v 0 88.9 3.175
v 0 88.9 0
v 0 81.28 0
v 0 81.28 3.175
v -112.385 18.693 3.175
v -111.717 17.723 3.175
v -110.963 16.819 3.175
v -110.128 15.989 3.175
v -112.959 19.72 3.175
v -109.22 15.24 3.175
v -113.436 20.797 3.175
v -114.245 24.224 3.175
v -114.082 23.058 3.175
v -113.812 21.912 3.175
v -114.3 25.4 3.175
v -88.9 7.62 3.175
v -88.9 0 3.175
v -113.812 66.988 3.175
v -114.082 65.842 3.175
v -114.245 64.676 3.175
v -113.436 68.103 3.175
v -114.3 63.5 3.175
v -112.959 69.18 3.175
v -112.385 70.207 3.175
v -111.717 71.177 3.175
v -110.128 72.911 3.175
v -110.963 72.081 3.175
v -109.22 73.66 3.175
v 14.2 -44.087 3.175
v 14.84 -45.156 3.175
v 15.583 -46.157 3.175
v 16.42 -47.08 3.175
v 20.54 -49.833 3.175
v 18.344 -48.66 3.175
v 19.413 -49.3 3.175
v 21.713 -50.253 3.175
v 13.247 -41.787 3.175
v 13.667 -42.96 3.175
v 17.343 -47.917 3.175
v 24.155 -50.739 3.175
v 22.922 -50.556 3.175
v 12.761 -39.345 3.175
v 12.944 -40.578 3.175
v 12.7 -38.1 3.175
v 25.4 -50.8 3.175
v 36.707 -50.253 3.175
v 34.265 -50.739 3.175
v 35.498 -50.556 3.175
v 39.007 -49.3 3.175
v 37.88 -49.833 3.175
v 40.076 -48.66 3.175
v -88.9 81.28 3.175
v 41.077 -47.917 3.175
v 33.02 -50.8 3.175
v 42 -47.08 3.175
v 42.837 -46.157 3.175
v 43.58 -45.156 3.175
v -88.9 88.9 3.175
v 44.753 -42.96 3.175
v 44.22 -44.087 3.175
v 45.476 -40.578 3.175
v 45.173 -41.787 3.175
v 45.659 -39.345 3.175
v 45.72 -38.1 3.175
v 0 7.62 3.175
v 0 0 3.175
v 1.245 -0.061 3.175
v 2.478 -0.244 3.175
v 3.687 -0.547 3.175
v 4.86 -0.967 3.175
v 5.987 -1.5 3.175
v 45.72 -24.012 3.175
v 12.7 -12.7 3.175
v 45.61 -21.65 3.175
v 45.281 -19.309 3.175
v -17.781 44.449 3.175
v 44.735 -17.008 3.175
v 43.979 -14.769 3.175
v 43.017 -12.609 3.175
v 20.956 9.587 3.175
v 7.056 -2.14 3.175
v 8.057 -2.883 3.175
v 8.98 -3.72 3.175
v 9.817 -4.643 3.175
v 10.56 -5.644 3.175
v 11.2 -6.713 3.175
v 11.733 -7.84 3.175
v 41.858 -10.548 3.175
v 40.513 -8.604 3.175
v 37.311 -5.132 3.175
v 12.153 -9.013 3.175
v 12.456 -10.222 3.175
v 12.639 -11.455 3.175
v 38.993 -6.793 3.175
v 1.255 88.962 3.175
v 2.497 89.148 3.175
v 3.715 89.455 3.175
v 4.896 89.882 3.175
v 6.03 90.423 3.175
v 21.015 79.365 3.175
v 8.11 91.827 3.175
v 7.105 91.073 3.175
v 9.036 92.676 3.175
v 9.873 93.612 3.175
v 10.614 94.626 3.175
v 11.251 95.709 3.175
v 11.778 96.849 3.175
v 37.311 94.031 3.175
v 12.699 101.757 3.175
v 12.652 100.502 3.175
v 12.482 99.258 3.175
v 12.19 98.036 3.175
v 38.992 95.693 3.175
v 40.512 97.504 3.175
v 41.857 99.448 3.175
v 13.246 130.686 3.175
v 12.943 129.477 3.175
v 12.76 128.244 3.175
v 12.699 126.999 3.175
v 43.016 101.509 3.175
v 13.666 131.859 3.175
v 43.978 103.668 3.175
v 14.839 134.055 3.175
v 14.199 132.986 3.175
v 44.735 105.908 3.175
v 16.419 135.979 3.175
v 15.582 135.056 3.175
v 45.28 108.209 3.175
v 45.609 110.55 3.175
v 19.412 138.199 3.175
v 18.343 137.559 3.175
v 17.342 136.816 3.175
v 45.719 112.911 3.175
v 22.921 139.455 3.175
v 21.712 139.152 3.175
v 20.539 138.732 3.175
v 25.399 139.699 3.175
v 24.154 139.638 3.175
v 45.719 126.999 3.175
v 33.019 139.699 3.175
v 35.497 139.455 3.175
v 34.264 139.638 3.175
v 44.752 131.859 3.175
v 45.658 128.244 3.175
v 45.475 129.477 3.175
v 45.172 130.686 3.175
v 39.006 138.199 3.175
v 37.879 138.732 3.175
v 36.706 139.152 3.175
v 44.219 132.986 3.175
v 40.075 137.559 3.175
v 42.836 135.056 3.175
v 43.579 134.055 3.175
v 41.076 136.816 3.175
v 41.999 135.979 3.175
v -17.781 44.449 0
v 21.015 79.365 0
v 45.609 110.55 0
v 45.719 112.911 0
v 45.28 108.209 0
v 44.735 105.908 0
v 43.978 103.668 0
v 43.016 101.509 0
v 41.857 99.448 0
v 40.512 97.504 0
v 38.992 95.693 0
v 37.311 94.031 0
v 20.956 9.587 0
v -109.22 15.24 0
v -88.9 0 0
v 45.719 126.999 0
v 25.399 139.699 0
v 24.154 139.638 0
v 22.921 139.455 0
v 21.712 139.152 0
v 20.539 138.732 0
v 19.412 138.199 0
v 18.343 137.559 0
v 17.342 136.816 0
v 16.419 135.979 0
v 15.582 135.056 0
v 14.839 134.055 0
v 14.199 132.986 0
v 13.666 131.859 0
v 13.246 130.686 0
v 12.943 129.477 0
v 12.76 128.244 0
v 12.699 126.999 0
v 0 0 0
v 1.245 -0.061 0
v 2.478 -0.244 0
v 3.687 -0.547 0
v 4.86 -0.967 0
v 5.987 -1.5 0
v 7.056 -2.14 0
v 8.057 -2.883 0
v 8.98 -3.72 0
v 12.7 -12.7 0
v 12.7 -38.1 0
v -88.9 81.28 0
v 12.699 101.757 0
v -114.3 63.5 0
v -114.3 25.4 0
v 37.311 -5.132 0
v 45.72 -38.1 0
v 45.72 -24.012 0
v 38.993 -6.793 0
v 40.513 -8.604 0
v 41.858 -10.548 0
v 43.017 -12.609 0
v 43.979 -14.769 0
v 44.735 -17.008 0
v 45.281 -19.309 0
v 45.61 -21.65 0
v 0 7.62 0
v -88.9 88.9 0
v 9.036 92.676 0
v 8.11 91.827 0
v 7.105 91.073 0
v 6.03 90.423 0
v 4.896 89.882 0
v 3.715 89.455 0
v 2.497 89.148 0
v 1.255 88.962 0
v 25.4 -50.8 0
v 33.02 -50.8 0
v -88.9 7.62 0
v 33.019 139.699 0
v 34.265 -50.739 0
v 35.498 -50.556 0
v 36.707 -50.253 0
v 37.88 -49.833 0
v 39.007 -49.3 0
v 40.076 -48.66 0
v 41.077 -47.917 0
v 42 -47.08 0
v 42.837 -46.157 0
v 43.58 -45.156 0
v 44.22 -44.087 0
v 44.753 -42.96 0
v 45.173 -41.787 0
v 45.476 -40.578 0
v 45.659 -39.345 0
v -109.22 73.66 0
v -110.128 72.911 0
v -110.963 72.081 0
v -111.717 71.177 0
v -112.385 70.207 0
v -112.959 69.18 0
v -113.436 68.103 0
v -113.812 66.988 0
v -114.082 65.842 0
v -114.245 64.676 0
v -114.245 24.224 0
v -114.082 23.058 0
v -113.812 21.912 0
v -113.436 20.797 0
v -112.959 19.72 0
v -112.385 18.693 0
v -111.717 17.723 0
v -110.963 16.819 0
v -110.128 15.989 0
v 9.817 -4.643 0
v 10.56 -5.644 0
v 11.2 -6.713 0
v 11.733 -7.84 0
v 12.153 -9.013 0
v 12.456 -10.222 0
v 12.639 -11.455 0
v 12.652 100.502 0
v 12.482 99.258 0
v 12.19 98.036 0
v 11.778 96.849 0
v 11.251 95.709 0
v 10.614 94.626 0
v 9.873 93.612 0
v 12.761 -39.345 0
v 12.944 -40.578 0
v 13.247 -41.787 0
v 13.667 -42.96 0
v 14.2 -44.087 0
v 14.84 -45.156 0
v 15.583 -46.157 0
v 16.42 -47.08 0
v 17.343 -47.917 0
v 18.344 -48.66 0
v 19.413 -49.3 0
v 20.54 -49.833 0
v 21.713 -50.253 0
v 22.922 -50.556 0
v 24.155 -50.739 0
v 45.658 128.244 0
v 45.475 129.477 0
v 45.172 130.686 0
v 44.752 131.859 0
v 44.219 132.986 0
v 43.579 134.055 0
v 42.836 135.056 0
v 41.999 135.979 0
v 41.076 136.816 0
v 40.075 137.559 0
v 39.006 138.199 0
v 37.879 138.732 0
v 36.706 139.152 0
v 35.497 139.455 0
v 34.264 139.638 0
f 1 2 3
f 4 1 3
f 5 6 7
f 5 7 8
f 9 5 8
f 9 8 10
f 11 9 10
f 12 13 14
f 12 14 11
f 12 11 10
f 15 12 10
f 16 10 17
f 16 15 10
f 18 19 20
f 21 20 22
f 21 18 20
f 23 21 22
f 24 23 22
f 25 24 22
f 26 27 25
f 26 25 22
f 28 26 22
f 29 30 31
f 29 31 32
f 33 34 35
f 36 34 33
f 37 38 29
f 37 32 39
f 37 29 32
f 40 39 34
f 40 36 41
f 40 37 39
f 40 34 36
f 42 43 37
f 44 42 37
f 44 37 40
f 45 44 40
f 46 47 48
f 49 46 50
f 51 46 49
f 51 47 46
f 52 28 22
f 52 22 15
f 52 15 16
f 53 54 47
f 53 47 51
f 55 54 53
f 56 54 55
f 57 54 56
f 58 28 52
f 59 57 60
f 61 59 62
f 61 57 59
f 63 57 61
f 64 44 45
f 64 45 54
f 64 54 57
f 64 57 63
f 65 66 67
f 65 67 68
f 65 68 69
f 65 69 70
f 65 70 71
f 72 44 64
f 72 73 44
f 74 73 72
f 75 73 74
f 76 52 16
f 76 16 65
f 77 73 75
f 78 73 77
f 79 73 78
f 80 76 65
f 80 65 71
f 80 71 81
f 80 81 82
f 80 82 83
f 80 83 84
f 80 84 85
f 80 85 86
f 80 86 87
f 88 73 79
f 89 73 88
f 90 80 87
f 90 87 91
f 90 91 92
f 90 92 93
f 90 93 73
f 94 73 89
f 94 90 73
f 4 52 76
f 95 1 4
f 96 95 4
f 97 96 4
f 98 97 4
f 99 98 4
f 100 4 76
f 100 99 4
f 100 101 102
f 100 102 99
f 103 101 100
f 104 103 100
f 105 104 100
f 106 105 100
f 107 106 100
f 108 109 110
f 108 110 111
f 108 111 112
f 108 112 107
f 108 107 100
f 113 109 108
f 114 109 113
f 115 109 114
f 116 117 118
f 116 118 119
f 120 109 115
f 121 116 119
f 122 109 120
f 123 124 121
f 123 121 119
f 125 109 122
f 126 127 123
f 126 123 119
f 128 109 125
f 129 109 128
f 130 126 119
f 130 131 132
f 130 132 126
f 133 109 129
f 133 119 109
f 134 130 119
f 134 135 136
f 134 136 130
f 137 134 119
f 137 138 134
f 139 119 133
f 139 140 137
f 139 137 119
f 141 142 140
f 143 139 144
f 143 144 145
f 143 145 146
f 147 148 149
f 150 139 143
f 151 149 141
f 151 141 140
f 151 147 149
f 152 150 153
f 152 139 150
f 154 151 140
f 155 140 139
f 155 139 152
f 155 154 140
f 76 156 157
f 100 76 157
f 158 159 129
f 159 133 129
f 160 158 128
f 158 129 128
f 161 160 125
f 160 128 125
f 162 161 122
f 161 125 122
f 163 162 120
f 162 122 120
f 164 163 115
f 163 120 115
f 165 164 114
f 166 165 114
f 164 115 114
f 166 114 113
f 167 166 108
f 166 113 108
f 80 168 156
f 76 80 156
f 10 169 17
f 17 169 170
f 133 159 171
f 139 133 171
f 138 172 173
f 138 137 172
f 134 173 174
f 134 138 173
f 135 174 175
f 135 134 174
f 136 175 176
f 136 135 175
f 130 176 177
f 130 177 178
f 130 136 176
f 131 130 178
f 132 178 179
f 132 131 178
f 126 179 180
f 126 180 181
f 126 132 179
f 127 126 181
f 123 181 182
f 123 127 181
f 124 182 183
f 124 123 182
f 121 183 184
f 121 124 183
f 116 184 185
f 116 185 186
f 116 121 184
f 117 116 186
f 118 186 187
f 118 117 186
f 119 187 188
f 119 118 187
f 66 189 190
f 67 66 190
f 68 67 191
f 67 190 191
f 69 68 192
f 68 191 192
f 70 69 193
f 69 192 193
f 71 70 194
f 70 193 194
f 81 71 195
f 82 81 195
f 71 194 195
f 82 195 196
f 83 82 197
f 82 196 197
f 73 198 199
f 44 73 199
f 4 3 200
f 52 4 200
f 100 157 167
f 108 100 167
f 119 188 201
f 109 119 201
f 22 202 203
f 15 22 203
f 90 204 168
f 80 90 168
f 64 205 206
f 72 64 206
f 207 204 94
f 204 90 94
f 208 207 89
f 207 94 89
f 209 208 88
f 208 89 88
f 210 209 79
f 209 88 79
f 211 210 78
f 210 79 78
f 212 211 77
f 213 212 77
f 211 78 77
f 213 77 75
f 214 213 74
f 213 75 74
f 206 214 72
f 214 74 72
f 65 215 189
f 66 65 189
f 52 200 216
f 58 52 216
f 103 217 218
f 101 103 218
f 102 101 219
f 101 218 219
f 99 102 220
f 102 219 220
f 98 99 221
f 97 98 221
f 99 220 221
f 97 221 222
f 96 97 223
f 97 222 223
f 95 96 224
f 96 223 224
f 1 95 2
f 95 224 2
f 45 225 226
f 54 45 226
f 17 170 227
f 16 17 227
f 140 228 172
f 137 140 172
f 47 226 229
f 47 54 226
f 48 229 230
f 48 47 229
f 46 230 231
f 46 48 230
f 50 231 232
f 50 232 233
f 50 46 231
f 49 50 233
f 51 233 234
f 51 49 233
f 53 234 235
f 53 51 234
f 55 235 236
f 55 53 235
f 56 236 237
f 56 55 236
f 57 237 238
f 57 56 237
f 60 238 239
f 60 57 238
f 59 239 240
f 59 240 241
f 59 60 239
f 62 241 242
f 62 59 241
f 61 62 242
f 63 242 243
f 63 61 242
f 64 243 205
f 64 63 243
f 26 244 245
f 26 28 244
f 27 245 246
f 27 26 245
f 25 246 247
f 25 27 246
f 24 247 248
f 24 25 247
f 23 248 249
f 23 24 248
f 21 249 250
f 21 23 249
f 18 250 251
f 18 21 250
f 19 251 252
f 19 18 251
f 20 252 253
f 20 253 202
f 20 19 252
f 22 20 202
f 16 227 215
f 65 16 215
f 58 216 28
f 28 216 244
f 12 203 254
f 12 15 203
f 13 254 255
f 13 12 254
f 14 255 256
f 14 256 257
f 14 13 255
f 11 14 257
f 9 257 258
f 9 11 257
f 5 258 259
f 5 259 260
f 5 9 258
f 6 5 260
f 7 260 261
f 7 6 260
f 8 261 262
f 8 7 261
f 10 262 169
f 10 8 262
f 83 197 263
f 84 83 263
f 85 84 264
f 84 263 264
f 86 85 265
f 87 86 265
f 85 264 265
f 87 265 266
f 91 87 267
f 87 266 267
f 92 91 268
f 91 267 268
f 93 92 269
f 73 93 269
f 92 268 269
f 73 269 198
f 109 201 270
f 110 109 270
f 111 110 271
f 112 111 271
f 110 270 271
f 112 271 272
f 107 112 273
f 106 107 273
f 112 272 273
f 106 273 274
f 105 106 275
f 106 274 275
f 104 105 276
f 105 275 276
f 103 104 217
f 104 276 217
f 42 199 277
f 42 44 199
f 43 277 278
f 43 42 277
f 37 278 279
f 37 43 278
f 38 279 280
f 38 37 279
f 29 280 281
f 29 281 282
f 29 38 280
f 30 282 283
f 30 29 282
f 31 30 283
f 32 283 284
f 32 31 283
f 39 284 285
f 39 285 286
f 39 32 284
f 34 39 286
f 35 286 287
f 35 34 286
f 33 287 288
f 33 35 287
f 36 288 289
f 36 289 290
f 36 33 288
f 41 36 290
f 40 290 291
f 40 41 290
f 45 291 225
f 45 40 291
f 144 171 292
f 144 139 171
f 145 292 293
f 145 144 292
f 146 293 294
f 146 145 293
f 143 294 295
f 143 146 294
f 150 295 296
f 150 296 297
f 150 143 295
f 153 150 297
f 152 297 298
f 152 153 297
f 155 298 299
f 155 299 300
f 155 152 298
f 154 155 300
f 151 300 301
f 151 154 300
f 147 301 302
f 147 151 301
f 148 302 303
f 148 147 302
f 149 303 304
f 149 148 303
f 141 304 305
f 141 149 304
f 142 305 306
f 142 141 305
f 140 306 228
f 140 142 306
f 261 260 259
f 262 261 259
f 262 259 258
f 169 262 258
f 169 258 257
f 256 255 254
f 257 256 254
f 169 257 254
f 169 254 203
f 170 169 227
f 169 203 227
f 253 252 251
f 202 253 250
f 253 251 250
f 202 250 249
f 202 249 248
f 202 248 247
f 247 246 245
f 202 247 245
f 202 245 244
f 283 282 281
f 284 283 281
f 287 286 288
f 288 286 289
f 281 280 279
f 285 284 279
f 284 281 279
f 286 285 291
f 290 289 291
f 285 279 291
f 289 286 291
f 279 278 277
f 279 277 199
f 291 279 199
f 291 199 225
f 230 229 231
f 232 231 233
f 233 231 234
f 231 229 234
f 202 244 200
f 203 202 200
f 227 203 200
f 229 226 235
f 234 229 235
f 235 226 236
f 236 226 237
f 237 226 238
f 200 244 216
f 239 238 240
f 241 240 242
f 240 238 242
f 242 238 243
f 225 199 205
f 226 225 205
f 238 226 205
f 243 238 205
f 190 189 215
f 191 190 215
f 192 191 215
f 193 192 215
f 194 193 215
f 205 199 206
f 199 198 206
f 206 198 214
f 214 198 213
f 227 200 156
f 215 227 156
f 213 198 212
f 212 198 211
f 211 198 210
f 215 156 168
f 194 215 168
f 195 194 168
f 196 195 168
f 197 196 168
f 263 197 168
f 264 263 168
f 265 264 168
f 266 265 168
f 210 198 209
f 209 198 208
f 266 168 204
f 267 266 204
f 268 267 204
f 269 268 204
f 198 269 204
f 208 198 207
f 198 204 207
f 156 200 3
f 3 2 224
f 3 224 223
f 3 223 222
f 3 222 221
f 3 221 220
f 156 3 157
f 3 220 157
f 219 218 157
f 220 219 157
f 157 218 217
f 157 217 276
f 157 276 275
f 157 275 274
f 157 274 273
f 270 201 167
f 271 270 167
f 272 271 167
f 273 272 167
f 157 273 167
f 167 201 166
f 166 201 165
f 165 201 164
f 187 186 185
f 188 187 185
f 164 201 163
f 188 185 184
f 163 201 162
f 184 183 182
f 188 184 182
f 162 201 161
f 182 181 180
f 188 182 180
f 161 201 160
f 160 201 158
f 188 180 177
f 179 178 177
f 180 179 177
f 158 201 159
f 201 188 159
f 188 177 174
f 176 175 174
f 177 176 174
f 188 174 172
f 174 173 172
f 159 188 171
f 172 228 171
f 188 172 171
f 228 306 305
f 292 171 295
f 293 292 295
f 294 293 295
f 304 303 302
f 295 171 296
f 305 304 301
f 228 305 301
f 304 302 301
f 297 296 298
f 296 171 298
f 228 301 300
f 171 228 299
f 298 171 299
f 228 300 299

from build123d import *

# Parameters (mm, degrees)
F1_DEPTH = 3.175
F2_R     = 12.7
F3_R     = 25.4


with BuildPart() as f1:
    # F0 (on Top) → F1 (new body)
    with BuildSketch(Plane.XY):
        with BuildLine():
            Line((9.035718, 92.67555), (21.014816, 79.365334))
            Line((21.014816, 79.365334), (45.719025, 101.598944))
            Line((45.719025, 101.598944), (45.719025, 139.698944))
            Line((45.719025, 139.698944), (12.699025, 139.698944))
            Line((12.699025, 139.698944), (12.699025, 101.757354))
            ThreePointArc((12.699025, 101.757354), (11.777927, 96.849164), (9.035718, 92.67555))
        make_face()
        with BuildLine():
            ThreePointArc((0, 0), (4.86008, -0.96673), (8.980256, -3.719744))
            Line((8.980256, -3.719744), (20.956198, 9.587422))
            Line((20.956198, 9.587422), (-17.780975, 44.449402))
            Line((-17.780975, 44.449402), (21.014816, 79.365334))
            Line((21.014816, 79.365334), (9.035718, 92.67555))
            ThreePointArc((9.035718, 92.67555), (4.896401, 89.881841), (0, 88.9))
            Line((0, 88.9), (0, 81.28))
            Line((0, 81.28), (-78.74, 81.28))
            Line((-78.74, 81.28), (-78.74, 68.58))
            Line((-78.74, 68.58), (-78.74, 7.62))
            Line((-78.74, 7.62), (0, 7.62))
            Line((0, 7.62), (0, 0))
        make_face()
        with BuildLine():
            ThreePointArc((8.980256, -3.719744), (11.73327, -7.83992), (12.7, -12.7))
            Line((12.7, -12.7), (12.7, -50.8))
            Line((12.7, -50.8), (45.72, -50.8))
            Line((45.72, -50.8), (45.72, -12.699057))
            Line((45.72, -12.699057), (20.956198, 9.587422))
            Line((20.956198, 9.587422), (8.980256, -3.719744))
        make_face()
        Polygon((-88.9, 7.62), (-78.74, 7.62), (-78.74, 68.58), (-78.74, 81.28), (-88.9, 81.28), (-88.9, 88.9), (-114.3, 69.85), (-114.3, 19.05), (-88.9, 0), align=None)
    extrude(amount=F1_DEPTH)

    # F2
    f2_edges = [f1.edges().sort_by_distance(p)[0] for p in [
        (-114.3, 69.85, 1.5875),
        (-114.3, 19.05, 1.5875),
        (12.7, -50.8, 1.5875),
        (45.72, -50.8, 1.5875),
        (45.719025, 139.698944, 1.5875),
        (12.699025, 139.698944, 1.5875),
    ]]
    fillet(f2_edges, radius=F2_R)

    # F3
    f3_edges = [f1.edges().sort_by_distance(p)[0] for p in [
        (45.719025, 101.598944, 1.5875),
        (45.72, -12.699057, 1.5875),
    ]]
    fillet(f3_edges, radius=F3_R)


solid = f1.part
